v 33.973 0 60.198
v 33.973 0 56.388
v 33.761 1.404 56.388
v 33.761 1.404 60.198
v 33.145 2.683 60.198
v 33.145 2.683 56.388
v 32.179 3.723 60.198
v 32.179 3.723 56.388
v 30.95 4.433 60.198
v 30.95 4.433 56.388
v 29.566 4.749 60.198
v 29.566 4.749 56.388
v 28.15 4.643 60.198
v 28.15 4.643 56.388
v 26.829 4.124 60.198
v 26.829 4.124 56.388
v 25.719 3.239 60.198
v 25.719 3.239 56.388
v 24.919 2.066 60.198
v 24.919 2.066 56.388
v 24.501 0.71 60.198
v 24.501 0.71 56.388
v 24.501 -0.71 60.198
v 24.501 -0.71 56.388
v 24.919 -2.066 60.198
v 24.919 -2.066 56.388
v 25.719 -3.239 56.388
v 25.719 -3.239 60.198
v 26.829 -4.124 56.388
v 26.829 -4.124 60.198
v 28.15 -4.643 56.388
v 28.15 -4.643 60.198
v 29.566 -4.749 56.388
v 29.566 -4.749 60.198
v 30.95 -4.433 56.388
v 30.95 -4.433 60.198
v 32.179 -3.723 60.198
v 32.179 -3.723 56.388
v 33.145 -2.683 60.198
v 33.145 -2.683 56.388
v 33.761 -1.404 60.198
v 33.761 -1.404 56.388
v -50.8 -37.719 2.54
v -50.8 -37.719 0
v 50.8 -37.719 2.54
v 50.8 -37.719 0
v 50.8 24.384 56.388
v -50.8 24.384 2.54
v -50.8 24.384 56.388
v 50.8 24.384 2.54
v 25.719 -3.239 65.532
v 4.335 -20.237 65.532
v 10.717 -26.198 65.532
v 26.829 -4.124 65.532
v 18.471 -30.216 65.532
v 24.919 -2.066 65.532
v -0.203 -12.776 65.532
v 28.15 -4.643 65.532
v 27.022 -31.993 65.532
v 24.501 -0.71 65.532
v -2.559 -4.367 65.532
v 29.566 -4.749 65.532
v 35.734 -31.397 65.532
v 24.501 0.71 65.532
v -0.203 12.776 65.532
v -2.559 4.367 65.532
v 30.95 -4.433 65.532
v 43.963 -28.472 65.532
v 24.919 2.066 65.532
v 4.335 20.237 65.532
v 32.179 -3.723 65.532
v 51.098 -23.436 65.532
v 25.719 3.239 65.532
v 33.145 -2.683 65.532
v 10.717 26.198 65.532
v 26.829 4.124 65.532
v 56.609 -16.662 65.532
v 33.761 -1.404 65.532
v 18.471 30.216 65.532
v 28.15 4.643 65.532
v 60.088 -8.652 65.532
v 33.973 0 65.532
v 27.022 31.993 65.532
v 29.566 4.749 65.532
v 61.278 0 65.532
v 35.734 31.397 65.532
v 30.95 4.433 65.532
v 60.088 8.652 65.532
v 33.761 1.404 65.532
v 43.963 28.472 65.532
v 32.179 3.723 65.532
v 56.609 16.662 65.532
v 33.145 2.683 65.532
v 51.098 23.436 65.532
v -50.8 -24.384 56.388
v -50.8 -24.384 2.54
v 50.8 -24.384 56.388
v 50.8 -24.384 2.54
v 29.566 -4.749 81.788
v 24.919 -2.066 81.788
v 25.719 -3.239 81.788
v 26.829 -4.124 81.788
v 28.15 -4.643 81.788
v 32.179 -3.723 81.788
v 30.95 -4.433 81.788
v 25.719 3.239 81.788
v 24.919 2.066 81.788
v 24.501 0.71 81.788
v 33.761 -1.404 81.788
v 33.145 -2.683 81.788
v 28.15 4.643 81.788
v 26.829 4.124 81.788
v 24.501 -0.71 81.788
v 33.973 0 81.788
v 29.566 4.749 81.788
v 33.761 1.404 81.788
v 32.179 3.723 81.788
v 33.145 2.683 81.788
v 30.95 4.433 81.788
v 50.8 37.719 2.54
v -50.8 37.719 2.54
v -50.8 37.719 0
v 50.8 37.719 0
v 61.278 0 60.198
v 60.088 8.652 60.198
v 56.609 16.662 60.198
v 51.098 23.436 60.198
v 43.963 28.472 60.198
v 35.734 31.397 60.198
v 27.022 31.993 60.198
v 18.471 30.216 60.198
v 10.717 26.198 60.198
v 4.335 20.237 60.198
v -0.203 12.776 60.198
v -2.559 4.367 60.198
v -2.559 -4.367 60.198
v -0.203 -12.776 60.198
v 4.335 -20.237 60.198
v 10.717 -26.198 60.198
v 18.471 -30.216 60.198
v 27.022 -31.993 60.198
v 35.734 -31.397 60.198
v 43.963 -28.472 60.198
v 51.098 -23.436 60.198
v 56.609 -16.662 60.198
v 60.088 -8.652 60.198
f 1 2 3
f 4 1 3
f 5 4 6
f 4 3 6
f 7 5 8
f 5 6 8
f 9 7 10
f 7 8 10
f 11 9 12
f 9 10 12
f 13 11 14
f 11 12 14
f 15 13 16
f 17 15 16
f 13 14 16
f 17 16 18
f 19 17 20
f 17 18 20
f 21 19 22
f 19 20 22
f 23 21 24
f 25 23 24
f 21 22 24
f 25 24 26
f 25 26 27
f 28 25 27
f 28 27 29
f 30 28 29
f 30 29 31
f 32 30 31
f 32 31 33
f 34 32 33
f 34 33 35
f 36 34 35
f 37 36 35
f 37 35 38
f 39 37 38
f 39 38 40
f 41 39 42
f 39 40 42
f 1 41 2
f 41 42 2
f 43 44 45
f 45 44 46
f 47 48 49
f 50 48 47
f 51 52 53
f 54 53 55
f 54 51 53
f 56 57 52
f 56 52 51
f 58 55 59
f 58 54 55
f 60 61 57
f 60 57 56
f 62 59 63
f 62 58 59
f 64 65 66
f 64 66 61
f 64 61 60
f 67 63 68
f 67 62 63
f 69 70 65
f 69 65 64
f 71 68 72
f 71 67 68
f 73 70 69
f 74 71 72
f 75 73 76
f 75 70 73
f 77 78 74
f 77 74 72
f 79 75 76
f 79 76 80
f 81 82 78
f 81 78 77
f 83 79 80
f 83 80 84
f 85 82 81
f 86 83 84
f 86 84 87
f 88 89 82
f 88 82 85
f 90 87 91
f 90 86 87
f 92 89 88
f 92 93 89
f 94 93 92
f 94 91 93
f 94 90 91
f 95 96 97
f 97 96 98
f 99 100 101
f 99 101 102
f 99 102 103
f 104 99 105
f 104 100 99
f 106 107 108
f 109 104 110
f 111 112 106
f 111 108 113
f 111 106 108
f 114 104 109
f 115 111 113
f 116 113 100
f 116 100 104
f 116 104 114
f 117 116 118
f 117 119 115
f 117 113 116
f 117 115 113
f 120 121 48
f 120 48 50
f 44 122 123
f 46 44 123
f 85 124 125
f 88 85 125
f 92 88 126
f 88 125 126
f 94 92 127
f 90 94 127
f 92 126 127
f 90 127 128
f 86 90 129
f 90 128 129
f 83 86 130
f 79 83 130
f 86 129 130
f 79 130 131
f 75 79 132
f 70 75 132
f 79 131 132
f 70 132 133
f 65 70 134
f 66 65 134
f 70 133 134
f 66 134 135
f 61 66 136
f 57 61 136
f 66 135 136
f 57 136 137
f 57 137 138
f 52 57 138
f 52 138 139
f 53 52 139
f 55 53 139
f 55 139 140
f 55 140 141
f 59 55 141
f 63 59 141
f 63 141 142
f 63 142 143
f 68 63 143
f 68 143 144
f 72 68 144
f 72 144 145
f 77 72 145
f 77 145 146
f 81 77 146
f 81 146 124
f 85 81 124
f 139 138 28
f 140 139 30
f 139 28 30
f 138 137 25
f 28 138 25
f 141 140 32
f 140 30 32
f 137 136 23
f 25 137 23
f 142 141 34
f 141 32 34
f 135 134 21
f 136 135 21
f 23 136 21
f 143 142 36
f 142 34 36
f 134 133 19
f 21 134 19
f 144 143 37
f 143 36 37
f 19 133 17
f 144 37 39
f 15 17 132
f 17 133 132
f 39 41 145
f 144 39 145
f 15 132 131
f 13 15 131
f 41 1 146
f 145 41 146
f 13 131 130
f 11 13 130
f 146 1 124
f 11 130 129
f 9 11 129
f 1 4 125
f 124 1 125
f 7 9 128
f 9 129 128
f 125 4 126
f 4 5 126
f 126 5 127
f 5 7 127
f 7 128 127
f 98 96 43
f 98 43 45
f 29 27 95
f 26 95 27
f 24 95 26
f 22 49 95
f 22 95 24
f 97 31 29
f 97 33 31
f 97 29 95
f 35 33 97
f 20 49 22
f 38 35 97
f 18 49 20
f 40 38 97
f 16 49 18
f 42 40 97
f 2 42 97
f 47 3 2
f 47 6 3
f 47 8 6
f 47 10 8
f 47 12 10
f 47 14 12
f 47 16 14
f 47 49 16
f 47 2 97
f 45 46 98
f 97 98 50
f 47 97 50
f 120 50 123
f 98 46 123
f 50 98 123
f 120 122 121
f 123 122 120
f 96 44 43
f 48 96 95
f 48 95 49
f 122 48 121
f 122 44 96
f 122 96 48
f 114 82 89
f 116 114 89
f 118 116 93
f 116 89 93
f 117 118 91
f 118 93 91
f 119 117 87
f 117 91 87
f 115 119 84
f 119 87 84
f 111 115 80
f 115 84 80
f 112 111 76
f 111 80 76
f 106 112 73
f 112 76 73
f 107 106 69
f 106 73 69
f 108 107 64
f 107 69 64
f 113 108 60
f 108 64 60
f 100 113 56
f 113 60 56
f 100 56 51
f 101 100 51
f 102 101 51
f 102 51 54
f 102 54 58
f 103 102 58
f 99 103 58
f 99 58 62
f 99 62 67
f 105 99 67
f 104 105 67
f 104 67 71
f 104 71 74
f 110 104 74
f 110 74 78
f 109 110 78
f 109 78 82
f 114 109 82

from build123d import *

# Parameters (mm, degrees)
F0_W     = 101.6
F0_H     = 48.768
F1_DEPTH = 56.388
F0_H_2   = 13.335
F2_DEPTH = 2.54
F3_R     = 4.7625
F4_DEPTH = 25.4
F3_R_2   = 32.0675
F5_DEPTH = 9.144
F6_DEPTH = 3.81


with BuildPart() as f1:
    # F0 (on Top) → F1 (new body)
    with BuildSketch(Plane.XY):
        Rectangle(F0_W, F0_H)
    extrude(amount=F1_DEPTH)

    # F0 (on Top) → F2 (join)
    with BuildSketch(Plane.XY):
        with Locations((0, 31.0515)):
            Rectangle(F0_W, F0_H_2)
        with Locations((0, -31.0515)):
            Rectangle(F0_W, F0_H_2)
    extrude(amount=F2_DEPTH)

    # F3 (on face) → F4 (join)
    with BuildSketch(Plane.XY.offset(56.388)):
        with Locations((29.21, 0)):
            Circle(F3_R)
    extrude(amount=F4_DEPTH)

    # F3 (on face) → F5 (join)
    with BuildSketch(Plane.XY.offset(56.388)):
        with Locations((29.21, 0)):
            Circle(F3_R_2)
        with Locations((29.21, 0)):
            Circle(F3_R, mode=Mode.SUBTRACT)
    extrude(amount=F5_DEPTH)

    # F3 (on face) → F6 (cut)
    with BuildSketch(Plane.XY.offset(56.388)):
        with Locations((29.21, 0)):
            Circle(F3_R_2)
        with Locations((29.21, 0)):
            Circle(F3_R, mode=Mode.SUBTRACT)
    extrude(amount=F6_DEPTH, mode=Mode.SUBTRACT)


solid = f1.part
